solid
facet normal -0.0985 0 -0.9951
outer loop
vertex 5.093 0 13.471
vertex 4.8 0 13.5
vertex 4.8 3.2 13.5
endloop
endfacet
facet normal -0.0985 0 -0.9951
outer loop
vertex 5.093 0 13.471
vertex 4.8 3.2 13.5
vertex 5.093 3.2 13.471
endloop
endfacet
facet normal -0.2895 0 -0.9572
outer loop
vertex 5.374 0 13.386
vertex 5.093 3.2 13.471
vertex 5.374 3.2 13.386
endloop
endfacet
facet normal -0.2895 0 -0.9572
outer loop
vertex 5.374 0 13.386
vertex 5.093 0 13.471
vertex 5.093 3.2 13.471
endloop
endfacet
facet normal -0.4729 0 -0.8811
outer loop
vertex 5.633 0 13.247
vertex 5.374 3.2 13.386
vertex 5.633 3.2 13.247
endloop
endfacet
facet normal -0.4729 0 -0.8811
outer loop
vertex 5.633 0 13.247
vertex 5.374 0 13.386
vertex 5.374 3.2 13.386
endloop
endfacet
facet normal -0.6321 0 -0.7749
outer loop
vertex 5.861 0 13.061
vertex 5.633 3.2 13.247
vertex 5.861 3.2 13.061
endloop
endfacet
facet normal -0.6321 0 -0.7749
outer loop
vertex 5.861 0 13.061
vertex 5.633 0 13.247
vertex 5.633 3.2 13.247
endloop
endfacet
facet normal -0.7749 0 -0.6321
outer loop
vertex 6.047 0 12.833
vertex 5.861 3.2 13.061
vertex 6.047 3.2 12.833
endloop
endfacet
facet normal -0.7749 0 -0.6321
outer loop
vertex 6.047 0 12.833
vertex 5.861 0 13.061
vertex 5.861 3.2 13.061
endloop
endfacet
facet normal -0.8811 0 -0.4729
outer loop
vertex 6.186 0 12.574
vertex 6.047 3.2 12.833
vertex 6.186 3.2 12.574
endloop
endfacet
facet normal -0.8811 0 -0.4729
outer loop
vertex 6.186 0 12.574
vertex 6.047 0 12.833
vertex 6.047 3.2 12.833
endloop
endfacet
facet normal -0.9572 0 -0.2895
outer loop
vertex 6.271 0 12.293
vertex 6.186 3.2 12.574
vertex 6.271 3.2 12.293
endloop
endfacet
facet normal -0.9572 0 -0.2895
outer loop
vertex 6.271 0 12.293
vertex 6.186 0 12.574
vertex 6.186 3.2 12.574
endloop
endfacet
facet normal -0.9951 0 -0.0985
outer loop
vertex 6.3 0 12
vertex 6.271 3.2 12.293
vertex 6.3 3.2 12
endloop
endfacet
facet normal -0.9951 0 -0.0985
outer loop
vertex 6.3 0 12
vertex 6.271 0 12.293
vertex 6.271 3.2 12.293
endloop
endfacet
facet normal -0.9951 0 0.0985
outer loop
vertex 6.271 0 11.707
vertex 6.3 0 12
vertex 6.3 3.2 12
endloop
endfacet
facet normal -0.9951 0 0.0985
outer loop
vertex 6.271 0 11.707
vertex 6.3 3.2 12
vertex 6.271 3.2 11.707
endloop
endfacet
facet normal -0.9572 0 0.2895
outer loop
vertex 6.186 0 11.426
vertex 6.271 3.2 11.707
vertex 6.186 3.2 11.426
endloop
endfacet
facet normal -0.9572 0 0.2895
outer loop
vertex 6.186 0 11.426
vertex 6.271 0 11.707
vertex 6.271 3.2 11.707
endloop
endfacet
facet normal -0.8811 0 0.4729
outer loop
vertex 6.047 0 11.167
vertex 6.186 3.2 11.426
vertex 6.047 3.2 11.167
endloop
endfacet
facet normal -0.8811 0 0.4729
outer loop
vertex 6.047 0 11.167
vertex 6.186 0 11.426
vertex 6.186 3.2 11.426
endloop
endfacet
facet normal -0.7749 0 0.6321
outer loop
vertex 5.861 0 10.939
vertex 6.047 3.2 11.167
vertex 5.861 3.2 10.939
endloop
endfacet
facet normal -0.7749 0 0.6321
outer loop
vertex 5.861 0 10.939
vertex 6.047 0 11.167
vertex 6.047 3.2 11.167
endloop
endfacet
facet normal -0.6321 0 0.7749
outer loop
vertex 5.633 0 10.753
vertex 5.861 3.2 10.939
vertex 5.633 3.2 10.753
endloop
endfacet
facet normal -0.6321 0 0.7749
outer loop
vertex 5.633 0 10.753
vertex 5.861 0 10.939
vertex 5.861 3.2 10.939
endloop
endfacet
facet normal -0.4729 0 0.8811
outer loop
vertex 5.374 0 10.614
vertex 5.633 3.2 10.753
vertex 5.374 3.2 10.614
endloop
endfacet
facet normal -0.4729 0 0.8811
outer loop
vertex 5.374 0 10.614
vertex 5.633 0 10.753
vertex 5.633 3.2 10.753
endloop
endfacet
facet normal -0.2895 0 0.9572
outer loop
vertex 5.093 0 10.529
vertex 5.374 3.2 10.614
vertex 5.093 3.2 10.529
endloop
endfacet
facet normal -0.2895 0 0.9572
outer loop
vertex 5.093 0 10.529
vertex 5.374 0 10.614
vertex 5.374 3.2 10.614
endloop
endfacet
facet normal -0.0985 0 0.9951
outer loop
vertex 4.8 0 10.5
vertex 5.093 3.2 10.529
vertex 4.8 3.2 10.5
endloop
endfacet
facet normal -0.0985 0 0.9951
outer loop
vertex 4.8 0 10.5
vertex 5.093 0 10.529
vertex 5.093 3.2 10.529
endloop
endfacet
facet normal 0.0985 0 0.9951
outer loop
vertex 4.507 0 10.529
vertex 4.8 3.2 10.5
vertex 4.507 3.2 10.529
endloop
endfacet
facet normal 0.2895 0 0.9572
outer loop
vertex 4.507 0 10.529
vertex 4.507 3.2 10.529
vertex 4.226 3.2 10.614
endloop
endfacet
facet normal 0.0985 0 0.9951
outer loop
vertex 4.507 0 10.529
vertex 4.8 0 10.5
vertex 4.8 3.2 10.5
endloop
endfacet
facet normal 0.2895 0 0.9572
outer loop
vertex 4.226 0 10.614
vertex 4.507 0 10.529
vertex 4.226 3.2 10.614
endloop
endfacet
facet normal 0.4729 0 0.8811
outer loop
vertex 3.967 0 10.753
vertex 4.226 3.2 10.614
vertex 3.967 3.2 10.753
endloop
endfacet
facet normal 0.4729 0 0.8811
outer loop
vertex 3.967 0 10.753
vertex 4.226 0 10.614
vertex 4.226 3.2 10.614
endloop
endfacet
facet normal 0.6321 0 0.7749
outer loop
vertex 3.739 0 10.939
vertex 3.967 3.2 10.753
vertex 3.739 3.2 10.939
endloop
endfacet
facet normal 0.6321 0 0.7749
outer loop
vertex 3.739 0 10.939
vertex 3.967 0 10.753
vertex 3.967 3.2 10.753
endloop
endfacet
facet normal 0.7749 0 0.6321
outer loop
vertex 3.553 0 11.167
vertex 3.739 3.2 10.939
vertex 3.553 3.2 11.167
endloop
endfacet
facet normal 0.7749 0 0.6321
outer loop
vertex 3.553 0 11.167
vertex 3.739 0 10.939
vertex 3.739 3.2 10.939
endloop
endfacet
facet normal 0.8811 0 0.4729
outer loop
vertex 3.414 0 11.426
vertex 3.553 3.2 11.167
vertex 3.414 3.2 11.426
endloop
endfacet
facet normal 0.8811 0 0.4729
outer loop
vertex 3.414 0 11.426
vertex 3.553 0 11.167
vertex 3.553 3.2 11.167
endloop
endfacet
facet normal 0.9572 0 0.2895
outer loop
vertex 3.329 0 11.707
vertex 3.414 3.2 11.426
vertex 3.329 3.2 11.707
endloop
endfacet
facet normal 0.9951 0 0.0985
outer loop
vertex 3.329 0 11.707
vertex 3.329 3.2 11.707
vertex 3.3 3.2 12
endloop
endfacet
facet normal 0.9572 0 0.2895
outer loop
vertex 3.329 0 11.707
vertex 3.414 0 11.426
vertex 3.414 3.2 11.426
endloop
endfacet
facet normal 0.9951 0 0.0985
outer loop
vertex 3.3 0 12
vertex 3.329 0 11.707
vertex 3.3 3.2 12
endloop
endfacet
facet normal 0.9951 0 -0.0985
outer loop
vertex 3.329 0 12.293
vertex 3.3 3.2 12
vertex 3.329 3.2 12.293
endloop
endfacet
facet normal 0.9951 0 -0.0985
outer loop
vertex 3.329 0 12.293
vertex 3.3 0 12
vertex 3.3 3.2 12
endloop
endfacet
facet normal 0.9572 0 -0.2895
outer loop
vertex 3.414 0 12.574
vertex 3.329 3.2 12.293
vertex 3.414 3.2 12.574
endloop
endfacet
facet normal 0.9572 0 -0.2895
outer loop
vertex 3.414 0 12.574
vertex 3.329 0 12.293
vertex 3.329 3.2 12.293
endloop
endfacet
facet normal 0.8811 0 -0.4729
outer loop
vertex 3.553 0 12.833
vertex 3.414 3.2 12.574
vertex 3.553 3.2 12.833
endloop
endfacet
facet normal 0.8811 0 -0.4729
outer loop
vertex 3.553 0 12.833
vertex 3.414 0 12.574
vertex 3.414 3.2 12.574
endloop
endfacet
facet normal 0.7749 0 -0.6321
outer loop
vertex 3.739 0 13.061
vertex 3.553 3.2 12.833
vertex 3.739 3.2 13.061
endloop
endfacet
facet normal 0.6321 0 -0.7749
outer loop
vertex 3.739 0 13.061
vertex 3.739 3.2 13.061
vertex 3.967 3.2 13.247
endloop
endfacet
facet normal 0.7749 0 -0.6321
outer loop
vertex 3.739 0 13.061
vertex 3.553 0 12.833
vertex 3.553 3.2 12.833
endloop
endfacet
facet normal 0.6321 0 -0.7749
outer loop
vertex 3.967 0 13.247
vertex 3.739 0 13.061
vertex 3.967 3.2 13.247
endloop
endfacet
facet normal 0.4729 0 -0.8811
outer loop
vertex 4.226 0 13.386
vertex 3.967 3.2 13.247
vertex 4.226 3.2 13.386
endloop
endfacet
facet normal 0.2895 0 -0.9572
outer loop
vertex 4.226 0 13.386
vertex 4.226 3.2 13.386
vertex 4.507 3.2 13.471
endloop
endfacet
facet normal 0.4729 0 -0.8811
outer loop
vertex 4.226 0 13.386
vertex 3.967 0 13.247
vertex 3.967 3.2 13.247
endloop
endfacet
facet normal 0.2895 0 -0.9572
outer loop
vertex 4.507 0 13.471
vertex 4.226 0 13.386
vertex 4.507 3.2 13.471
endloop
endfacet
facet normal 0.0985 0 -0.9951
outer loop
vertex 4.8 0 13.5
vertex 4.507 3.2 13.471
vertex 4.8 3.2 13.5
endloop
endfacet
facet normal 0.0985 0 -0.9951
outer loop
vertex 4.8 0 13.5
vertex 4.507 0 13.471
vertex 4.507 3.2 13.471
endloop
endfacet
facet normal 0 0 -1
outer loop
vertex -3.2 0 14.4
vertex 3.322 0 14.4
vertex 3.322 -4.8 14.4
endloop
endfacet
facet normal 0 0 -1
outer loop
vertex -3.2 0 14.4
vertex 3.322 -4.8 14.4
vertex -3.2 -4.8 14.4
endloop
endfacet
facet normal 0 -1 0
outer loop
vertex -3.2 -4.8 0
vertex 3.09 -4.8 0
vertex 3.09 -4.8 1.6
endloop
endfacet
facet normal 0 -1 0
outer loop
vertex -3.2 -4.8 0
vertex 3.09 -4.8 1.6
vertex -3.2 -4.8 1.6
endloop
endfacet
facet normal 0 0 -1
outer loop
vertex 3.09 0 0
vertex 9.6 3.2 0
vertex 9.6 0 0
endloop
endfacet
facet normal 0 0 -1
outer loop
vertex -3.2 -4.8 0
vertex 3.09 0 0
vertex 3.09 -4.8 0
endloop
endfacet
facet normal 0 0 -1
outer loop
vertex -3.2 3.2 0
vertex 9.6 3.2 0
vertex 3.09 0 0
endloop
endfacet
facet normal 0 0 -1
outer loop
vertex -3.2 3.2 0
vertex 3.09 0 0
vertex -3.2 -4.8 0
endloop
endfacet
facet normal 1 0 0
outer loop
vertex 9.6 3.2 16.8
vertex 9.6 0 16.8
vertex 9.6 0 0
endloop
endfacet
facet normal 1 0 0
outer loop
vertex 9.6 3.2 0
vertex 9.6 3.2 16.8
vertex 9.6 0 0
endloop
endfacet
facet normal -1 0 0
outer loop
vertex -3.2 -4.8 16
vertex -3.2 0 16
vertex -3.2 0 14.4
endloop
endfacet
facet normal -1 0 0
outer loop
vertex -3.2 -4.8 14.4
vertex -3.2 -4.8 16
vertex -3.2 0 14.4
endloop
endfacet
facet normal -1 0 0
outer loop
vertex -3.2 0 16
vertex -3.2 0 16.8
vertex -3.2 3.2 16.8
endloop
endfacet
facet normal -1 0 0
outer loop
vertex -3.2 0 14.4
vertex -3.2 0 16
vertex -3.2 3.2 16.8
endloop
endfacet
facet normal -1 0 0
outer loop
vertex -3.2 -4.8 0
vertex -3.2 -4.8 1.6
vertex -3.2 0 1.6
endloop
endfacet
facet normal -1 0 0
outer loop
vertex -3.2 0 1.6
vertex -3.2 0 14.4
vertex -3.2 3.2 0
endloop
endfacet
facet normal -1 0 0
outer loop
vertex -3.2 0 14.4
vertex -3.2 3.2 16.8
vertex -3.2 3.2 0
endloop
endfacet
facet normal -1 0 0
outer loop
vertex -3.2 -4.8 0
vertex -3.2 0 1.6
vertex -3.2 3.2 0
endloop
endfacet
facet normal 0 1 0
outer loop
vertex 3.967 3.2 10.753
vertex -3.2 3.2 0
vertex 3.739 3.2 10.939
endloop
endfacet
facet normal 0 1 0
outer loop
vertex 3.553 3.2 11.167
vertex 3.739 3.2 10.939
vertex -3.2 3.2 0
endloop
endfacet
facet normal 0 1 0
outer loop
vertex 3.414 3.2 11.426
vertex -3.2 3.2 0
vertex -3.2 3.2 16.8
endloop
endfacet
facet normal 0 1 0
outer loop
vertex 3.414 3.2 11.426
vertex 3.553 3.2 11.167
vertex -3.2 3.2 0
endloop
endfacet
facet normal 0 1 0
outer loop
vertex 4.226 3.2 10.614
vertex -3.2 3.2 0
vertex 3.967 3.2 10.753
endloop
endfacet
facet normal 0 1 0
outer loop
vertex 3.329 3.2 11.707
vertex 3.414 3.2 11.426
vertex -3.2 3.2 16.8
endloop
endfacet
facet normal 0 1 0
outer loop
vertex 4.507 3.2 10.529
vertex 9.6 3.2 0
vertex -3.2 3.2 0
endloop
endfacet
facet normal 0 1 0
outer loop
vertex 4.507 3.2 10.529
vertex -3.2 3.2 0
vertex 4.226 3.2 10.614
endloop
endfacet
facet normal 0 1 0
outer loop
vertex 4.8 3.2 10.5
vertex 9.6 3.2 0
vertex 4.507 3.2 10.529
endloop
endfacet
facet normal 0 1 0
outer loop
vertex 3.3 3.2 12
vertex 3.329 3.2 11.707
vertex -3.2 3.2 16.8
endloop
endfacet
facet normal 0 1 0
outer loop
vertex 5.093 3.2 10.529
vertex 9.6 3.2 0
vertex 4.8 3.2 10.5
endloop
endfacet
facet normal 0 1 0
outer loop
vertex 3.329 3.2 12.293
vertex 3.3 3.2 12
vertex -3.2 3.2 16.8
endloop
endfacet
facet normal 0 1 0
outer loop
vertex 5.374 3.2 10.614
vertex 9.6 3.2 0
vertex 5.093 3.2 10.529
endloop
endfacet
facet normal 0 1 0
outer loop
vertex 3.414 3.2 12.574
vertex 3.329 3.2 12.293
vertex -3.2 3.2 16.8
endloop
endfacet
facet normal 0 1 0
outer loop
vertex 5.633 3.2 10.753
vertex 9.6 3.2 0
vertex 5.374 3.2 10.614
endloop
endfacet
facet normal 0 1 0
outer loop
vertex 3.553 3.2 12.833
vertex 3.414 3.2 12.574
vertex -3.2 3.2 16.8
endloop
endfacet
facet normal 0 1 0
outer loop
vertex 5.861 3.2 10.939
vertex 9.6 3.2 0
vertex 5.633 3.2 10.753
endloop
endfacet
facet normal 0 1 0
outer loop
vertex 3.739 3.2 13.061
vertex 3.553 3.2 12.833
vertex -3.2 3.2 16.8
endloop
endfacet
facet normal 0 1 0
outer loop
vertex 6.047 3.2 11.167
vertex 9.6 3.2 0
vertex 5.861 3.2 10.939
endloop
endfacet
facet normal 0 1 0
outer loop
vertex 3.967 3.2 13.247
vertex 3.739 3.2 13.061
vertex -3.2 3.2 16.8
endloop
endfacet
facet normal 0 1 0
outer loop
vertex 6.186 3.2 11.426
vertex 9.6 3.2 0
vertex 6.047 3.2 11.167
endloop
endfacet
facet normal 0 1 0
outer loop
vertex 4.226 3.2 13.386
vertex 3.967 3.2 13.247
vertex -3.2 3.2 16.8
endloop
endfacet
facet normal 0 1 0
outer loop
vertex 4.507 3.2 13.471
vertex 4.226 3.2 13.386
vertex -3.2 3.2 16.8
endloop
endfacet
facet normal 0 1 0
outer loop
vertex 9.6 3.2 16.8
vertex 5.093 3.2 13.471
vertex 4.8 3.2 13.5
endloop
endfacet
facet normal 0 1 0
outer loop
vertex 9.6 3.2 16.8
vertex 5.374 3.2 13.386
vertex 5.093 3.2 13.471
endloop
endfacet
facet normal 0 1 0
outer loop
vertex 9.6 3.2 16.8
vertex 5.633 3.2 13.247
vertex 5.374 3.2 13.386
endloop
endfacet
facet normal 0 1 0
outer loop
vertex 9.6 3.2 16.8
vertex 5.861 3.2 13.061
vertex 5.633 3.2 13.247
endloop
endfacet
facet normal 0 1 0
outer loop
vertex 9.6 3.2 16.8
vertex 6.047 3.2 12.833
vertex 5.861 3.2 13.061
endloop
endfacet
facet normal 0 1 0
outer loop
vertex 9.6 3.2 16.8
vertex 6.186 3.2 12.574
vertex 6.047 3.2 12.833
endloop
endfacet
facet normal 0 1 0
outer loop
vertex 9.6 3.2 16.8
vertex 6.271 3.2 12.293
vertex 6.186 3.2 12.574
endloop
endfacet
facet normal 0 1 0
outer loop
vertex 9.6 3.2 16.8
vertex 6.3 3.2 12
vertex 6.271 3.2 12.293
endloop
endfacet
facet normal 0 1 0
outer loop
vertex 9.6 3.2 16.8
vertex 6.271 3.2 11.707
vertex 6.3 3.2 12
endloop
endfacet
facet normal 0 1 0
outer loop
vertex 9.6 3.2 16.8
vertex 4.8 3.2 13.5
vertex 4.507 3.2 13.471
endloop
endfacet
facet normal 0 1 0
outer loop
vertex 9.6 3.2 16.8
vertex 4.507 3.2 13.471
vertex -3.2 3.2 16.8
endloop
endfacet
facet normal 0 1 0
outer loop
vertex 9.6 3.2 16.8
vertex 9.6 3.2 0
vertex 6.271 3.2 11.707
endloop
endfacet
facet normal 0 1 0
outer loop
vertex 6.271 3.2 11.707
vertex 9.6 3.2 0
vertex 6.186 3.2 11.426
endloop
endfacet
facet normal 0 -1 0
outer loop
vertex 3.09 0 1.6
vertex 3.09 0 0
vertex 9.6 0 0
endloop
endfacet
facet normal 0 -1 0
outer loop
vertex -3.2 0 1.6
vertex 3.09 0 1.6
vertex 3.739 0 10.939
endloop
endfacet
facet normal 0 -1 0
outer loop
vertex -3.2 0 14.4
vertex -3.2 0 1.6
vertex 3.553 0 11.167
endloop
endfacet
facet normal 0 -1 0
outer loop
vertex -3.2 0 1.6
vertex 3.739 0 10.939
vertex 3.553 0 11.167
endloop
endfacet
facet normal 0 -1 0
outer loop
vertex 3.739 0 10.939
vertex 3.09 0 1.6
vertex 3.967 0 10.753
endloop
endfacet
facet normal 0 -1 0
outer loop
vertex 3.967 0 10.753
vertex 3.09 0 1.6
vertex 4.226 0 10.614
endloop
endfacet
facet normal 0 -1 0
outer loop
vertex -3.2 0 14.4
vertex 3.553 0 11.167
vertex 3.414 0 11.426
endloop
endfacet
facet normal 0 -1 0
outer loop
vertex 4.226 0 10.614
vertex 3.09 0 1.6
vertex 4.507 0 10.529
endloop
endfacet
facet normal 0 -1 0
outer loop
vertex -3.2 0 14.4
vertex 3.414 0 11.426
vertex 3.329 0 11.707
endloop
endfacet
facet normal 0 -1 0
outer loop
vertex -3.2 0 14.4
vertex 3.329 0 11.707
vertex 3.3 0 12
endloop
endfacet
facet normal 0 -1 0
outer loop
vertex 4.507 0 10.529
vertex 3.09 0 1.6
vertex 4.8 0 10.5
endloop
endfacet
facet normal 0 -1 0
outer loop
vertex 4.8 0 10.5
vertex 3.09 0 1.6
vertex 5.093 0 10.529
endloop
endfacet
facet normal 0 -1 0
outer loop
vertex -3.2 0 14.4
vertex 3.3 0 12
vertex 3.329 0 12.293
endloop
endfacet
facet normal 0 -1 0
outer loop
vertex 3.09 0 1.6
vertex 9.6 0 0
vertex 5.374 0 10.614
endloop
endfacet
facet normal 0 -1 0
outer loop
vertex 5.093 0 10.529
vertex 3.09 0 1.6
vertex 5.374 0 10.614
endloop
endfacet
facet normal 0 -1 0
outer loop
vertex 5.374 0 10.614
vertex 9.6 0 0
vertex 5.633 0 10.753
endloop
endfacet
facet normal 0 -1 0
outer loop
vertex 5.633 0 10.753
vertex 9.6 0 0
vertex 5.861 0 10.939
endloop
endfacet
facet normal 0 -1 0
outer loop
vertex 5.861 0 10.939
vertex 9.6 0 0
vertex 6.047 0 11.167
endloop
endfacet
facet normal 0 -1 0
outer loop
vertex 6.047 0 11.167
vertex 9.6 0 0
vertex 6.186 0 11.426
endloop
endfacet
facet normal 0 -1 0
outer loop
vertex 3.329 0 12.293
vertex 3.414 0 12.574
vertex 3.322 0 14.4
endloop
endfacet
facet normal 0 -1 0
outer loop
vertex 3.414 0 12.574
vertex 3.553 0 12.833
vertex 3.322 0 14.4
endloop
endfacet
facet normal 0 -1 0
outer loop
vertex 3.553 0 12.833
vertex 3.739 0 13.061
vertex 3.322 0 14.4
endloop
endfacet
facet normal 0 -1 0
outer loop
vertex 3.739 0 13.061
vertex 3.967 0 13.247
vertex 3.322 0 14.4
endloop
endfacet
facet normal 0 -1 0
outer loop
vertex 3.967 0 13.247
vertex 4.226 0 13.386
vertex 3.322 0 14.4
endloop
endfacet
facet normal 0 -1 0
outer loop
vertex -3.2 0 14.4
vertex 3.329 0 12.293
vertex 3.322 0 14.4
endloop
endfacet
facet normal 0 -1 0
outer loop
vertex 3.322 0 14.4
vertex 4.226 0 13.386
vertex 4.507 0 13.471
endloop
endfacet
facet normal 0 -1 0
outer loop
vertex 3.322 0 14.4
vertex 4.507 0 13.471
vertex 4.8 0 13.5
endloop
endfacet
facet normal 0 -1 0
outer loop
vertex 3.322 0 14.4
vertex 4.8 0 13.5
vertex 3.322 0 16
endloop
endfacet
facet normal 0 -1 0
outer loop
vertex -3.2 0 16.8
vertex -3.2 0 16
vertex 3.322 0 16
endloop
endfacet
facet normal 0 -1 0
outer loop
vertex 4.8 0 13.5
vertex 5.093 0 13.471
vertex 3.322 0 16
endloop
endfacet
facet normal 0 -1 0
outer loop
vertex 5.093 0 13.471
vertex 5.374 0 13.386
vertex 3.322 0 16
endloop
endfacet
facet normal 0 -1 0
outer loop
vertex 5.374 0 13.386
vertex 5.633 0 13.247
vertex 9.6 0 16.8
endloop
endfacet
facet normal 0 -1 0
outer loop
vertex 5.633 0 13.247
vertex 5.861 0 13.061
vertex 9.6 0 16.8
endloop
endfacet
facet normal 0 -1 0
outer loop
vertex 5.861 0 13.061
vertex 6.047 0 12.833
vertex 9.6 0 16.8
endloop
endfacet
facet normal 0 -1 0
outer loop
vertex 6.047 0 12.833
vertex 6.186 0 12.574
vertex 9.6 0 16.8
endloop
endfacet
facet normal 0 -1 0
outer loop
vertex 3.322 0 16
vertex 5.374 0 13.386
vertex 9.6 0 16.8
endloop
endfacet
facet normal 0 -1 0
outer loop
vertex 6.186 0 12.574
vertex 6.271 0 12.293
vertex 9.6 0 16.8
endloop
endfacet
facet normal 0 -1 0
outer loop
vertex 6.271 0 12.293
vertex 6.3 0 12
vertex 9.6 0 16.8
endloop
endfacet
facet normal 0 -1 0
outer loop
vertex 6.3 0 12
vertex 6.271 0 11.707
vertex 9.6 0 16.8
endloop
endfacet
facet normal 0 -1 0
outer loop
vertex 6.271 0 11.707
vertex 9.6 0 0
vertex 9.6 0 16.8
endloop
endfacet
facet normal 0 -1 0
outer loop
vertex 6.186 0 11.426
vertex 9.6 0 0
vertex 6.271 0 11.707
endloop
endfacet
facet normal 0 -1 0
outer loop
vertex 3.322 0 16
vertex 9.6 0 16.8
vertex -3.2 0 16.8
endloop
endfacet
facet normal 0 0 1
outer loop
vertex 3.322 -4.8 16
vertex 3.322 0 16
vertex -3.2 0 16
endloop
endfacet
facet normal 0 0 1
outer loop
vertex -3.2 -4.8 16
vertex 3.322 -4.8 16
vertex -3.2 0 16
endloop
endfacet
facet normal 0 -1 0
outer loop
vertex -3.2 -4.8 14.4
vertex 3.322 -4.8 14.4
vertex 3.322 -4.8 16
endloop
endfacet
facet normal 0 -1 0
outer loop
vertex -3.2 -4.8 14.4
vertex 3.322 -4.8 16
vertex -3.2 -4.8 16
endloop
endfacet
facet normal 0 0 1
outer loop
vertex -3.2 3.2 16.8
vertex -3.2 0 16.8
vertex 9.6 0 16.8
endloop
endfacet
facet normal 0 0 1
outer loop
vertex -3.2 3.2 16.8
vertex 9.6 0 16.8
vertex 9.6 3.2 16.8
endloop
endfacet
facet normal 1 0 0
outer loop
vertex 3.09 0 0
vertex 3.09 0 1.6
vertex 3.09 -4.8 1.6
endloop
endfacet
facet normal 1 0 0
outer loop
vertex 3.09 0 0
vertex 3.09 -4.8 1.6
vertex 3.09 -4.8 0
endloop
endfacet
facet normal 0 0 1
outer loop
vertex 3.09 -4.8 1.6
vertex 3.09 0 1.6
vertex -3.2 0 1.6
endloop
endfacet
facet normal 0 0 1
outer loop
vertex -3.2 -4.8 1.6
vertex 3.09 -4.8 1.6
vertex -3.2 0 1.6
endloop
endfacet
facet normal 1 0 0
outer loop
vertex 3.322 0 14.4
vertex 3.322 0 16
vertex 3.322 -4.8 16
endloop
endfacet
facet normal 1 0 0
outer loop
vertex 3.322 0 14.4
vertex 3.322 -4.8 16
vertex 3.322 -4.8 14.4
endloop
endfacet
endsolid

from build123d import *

# Parameters (mm, degrees)
SKETCH1_W           = 9.6
SKETCH1_H           = 16.8
SKETCH1_R           = 1.5
BOSS_EXTRUDE1_DEPTH = 3.2
SKETCH3_W           = 16.8
SKETCH3_H           = 3.2
BOSS_EXTRUDE2_DEPTH = 3.2
SKETCH4_W           = 6.522228594
SKETCH4_H           = 1.6
BOSS_EXTRUDE3_DEPTH = 4.8
SKETCH5_W           = 6.289556992
SKETCH5_H           = 1.6
BOSS_EXTRUDE4_DEPTH = 4.8


with BuildPart() as part:
    # Sketch1 → Boss-Extrude1 (new body)
    with BuildSketch(Plane(origin=(0, 0, 0), x_dir=(1, 0, 0), z_dir=(0, 1, 0))):
        with Locations((4.8, -8.4)):
            Rectangle(SKETCH1_W, SKETCH1_H)
        with Locations(Location((4.8, -12, 0), (0, 0, 270))):
            Circle(SKETCH1_R, mode=Mode.SUBTRACT)
    extrude(amount=BOSS_EXTRUDE1_DEPTH)

    # Sketch3 → Boss-Extrude2 (add)
    with BuildSketch(Plane.ZY):
        with Locations((8.4, 1.6)):
            Rectangle(SKETCH3_W, SKETCH3_H)
    extrude(amount=BOSS_EXTRUDE2_DEPTH)

    # Sketch4 → Boss-Extrude3 (add)
    with BuildSketch(Plane(origin=(0, 0, 0), x_dir=(-1, 0, 0), z_dir=(0, -1, 0))):
        with Locations((-0.061114297, -15.2)):
            Rectangle(SKETCH4_W, SKETCH4_H)
    extrude(amount=BOSS_EXTRUDE3_DEPTH)

    # Sketch5 → Boss-Extrude4 (add)
    with BuildSketch(Plane(origin=(0, 0, 0), x_dir=(-1, 0, 0), z_dir=(0, -1, 0))):
        with Locations((0.055221504, -0.8)):
            Rectangle(SKETCH5_W, SKETCH5_H)
    extrude(amount=BOSS_EXTRUDE4_DEPTH)


solid = part.part
